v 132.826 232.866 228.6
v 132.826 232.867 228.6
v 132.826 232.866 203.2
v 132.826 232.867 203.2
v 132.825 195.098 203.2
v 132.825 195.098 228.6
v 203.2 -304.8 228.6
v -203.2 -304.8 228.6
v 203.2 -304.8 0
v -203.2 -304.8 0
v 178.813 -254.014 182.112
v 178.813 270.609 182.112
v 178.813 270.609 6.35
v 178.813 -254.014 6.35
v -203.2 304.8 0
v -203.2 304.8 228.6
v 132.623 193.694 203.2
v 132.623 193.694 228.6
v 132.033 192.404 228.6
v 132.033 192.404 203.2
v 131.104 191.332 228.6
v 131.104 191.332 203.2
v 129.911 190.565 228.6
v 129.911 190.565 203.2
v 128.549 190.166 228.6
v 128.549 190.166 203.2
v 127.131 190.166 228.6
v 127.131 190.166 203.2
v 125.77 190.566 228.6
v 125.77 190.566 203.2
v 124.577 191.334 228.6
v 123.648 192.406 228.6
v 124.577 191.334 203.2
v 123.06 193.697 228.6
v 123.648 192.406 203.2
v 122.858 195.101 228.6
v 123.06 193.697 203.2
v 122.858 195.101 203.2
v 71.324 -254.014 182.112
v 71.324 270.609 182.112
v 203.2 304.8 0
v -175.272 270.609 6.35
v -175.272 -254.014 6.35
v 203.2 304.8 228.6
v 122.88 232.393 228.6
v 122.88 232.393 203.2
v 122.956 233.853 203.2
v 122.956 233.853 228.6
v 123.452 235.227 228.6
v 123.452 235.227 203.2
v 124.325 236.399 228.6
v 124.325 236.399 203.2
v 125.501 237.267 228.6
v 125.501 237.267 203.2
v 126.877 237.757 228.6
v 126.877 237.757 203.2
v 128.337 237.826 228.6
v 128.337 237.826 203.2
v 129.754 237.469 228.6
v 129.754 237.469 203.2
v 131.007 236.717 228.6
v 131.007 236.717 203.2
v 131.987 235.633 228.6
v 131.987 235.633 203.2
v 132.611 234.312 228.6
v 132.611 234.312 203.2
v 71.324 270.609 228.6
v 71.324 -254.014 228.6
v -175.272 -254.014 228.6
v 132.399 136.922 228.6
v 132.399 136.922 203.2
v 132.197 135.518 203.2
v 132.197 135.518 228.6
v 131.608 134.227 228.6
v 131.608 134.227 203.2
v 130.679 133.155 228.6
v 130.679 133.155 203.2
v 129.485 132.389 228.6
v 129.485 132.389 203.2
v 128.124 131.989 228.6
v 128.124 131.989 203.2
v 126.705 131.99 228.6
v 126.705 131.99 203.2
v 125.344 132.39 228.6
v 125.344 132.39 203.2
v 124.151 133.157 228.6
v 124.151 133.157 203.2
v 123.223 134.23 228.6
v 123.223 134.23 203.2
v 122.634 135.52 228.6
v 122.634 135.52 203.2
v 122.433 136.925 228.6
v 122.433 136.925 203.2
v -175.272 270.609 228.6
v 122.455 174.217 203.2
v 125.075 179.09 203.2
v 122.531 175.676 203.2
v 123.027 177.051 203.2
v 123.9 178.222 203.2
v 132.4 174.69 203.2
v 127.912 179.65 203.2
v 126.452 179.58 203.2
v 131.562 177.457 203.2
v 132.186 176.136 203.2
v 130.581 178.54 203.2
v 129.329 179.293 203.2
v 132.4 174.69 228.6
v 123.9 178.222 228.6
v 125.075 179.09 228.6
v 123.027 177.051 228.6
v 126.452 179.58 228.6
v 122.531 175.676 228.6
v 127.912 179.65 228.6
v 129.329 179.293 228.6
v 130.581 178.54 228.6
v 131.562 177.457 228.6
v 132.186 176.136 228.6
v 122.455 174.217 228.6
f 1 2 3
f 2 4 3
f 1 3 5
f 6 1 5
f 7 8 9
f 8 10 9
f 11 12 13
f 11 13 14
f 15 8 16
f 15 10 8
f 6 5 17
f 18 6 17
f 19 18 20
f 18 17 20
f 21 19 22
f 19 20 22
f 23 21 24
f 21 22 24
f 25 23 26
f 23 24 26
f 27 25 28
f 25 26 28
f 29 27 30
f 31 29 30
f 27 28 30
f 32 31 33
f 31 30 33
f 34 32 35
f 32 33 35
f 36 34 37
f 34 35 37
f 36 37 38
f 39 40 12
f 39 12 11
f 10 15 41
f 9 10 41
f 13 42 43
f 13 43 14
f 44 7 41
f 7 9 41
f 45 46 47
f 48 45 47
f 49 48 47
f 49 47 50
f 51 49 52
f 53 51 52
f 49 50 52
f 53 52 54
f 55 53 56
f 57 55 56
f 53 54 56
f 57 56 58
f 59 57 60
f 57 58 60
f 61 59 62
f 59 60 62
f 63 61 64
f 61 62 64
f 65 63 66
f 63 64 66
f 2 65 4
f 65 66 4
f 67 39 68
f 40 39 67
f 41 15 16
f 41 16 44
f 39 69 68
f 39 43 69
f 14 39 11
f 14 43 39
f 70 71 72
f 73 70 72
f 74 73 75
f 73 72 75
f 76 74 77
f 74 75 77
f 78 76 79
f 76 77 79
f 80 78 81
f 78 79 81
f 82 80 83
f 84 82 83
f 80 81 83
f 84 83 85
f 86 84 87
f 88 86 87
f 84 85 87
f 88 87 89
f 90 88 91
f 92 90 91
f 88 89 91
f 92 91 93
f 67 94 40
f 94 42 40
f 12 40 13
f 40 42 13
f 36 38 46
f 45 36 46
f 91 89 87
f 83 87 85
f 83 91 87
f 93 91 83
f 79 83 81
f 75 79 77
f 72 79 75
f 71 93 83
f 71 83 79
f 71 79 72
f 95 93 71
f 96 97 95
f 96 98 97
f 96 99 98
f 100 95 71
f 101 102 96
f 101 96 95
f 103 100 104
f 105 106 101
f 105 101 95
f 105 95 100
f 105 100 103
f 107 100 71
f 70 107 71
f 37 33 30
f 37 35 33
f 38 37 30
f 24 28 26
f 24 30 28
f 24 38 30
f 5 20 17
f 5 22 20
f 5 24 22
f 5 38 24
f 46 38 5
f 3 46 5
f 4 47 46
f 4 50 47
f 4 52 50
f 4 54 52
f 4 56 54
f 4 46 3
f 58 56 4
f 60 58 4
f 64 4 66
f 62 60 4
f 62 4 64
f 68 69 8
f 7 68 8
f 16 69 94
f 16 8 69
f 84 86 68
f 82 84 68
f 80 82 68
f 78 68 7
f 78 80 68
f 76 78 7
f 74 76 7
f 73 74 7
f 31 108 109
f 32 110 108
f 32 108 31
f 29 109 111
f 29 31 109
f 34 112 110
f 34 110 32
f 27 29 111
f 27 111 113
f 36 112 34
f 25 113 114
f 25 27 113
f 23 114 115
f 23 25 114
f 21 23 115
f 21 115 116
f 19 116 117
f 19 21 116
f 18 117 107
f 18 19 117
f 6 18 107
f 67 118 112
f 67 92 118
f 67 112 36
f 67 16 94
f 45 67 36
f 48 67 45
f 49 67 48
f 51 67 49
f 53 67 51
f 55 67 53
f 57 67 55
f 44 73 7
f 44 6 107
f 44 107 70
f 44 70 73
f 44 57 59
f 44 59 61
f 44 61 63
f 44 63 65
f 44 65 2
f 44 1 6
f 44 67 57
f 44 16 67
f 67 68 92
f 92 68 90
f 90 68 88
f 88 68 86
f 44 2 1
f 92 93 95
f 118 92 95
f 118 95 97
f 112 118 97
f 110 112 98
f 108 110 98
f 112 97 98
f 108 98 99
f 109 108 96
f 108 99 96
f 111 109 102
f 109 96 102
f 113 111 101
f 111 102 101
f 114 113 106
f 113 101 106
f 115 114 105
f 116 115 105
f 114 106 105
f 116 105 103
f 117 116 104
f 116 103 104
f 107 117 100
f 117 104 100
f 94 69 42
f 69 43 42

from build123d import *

# Parameters (mm, degrees)
F0_W     = 406.4
F0_H     = 609.6
F1_DEPTH = 203.2
F2_W     = 246.5967833996
F2_H     = 524.6225595474
F3_DEPTH = 196.85
F4_W     = 524.6225595474
F4_H     = 175.7622616529
F5_DEPTH = 107.4888
F6_W     = 406.4
F6_H     = 609.6
F6_W_2   = 246.5967833996
F6_H_2   = 524.6225595474
F7_DEPTH = 25.4


with BuildPart() as f1:
    # F0 (on Top) → F1 (new body)
    with BuildSketch(Plane.XY):
        Rectangle(F0_W, F0_H)
    extrude(amount=F1_DEPTH)

    # F2 (on face) → F3 (cut)
    with BuildSketch(Plane.XY.offset(203.2)):
        with Locations((-51.9739538431, 8.2974731922)):
            Rectangle(F2_W, F2_H)
    extrude(amount=-F3_DEPTH, mode=Mode.SUBTRACT)

    # F4 (on face) → F5 (cut)
    with BuildSketch(Plane(origin=(71.3244378567, 0, 0), x_dir=(0, -1, 0), z_dir=(-1, 0, 0))):
        with Locations((-8.2974731922, 94.2311308265)):
            Rectangle(F4_W, F4_H)
    extrude(amount=-F5_DEPTH, mode=Mode.SUBTRACT)

    # F6 (on face) → F7 (join)
    with BuildSketch(Plane.XY.offset(203.2)):
        Rectangle(F6_W, F6_H)
        with Locations((-51.9739538431, 8.2974731922)):
            Rectangle(F6_W_2, F6_H_2, mode=Mode.SUBTRACT)
        with BuildLine():
            ThreePointArc((132.4002933692, 174.6901672035), (132.4002933677, 174.6900416756), (132.4002933629, 174.6899161476))
            Line((132.4002933629, 174.6899161476), (132.3993421334, 136.9216628493))
            ThreePointArc((132.3993421334, 136.9216628493), (127.4147392292, 131.9386900836), (122.4331459754, 136.924671667))
            Line((122.4331459754, 136.924671667), (122.4547239005, 174.2168030567))
            ThreePointArc((122.4547239005, 174.2168030567), (127.1792936349, 179.66858125), (132.4002933692, 174.6901672035))
        make_face(mode=Mode.SUBTRACT)
        with BuildLine():
            ThreePointArc((132.8256002304, 232.8666895628), (132.8256002288, 232.8665640349), (132.8256002241, 232.866438507))
            Line((132.8256002241, 232.866438507), (132.8246489946, 195.0981852086))
            ThreePointArc((132.8246489946, 195.0981852086), (127.8400460904, 190.115212443), (122.8584528366, 195.1011940263))
            Line((122.8584528366, 195.1011940263), (122.8800307617, 232.393325416))
            ThreePointArc((122.8800307617, 232.393325416), (127.6046004961, 237.8451036093), (132.8256002304, 232.8666895628))
        make_face(mode=Mode.SUBTRACT)
    extrude(amount=F7_DEPTH)


solid = f1.part
